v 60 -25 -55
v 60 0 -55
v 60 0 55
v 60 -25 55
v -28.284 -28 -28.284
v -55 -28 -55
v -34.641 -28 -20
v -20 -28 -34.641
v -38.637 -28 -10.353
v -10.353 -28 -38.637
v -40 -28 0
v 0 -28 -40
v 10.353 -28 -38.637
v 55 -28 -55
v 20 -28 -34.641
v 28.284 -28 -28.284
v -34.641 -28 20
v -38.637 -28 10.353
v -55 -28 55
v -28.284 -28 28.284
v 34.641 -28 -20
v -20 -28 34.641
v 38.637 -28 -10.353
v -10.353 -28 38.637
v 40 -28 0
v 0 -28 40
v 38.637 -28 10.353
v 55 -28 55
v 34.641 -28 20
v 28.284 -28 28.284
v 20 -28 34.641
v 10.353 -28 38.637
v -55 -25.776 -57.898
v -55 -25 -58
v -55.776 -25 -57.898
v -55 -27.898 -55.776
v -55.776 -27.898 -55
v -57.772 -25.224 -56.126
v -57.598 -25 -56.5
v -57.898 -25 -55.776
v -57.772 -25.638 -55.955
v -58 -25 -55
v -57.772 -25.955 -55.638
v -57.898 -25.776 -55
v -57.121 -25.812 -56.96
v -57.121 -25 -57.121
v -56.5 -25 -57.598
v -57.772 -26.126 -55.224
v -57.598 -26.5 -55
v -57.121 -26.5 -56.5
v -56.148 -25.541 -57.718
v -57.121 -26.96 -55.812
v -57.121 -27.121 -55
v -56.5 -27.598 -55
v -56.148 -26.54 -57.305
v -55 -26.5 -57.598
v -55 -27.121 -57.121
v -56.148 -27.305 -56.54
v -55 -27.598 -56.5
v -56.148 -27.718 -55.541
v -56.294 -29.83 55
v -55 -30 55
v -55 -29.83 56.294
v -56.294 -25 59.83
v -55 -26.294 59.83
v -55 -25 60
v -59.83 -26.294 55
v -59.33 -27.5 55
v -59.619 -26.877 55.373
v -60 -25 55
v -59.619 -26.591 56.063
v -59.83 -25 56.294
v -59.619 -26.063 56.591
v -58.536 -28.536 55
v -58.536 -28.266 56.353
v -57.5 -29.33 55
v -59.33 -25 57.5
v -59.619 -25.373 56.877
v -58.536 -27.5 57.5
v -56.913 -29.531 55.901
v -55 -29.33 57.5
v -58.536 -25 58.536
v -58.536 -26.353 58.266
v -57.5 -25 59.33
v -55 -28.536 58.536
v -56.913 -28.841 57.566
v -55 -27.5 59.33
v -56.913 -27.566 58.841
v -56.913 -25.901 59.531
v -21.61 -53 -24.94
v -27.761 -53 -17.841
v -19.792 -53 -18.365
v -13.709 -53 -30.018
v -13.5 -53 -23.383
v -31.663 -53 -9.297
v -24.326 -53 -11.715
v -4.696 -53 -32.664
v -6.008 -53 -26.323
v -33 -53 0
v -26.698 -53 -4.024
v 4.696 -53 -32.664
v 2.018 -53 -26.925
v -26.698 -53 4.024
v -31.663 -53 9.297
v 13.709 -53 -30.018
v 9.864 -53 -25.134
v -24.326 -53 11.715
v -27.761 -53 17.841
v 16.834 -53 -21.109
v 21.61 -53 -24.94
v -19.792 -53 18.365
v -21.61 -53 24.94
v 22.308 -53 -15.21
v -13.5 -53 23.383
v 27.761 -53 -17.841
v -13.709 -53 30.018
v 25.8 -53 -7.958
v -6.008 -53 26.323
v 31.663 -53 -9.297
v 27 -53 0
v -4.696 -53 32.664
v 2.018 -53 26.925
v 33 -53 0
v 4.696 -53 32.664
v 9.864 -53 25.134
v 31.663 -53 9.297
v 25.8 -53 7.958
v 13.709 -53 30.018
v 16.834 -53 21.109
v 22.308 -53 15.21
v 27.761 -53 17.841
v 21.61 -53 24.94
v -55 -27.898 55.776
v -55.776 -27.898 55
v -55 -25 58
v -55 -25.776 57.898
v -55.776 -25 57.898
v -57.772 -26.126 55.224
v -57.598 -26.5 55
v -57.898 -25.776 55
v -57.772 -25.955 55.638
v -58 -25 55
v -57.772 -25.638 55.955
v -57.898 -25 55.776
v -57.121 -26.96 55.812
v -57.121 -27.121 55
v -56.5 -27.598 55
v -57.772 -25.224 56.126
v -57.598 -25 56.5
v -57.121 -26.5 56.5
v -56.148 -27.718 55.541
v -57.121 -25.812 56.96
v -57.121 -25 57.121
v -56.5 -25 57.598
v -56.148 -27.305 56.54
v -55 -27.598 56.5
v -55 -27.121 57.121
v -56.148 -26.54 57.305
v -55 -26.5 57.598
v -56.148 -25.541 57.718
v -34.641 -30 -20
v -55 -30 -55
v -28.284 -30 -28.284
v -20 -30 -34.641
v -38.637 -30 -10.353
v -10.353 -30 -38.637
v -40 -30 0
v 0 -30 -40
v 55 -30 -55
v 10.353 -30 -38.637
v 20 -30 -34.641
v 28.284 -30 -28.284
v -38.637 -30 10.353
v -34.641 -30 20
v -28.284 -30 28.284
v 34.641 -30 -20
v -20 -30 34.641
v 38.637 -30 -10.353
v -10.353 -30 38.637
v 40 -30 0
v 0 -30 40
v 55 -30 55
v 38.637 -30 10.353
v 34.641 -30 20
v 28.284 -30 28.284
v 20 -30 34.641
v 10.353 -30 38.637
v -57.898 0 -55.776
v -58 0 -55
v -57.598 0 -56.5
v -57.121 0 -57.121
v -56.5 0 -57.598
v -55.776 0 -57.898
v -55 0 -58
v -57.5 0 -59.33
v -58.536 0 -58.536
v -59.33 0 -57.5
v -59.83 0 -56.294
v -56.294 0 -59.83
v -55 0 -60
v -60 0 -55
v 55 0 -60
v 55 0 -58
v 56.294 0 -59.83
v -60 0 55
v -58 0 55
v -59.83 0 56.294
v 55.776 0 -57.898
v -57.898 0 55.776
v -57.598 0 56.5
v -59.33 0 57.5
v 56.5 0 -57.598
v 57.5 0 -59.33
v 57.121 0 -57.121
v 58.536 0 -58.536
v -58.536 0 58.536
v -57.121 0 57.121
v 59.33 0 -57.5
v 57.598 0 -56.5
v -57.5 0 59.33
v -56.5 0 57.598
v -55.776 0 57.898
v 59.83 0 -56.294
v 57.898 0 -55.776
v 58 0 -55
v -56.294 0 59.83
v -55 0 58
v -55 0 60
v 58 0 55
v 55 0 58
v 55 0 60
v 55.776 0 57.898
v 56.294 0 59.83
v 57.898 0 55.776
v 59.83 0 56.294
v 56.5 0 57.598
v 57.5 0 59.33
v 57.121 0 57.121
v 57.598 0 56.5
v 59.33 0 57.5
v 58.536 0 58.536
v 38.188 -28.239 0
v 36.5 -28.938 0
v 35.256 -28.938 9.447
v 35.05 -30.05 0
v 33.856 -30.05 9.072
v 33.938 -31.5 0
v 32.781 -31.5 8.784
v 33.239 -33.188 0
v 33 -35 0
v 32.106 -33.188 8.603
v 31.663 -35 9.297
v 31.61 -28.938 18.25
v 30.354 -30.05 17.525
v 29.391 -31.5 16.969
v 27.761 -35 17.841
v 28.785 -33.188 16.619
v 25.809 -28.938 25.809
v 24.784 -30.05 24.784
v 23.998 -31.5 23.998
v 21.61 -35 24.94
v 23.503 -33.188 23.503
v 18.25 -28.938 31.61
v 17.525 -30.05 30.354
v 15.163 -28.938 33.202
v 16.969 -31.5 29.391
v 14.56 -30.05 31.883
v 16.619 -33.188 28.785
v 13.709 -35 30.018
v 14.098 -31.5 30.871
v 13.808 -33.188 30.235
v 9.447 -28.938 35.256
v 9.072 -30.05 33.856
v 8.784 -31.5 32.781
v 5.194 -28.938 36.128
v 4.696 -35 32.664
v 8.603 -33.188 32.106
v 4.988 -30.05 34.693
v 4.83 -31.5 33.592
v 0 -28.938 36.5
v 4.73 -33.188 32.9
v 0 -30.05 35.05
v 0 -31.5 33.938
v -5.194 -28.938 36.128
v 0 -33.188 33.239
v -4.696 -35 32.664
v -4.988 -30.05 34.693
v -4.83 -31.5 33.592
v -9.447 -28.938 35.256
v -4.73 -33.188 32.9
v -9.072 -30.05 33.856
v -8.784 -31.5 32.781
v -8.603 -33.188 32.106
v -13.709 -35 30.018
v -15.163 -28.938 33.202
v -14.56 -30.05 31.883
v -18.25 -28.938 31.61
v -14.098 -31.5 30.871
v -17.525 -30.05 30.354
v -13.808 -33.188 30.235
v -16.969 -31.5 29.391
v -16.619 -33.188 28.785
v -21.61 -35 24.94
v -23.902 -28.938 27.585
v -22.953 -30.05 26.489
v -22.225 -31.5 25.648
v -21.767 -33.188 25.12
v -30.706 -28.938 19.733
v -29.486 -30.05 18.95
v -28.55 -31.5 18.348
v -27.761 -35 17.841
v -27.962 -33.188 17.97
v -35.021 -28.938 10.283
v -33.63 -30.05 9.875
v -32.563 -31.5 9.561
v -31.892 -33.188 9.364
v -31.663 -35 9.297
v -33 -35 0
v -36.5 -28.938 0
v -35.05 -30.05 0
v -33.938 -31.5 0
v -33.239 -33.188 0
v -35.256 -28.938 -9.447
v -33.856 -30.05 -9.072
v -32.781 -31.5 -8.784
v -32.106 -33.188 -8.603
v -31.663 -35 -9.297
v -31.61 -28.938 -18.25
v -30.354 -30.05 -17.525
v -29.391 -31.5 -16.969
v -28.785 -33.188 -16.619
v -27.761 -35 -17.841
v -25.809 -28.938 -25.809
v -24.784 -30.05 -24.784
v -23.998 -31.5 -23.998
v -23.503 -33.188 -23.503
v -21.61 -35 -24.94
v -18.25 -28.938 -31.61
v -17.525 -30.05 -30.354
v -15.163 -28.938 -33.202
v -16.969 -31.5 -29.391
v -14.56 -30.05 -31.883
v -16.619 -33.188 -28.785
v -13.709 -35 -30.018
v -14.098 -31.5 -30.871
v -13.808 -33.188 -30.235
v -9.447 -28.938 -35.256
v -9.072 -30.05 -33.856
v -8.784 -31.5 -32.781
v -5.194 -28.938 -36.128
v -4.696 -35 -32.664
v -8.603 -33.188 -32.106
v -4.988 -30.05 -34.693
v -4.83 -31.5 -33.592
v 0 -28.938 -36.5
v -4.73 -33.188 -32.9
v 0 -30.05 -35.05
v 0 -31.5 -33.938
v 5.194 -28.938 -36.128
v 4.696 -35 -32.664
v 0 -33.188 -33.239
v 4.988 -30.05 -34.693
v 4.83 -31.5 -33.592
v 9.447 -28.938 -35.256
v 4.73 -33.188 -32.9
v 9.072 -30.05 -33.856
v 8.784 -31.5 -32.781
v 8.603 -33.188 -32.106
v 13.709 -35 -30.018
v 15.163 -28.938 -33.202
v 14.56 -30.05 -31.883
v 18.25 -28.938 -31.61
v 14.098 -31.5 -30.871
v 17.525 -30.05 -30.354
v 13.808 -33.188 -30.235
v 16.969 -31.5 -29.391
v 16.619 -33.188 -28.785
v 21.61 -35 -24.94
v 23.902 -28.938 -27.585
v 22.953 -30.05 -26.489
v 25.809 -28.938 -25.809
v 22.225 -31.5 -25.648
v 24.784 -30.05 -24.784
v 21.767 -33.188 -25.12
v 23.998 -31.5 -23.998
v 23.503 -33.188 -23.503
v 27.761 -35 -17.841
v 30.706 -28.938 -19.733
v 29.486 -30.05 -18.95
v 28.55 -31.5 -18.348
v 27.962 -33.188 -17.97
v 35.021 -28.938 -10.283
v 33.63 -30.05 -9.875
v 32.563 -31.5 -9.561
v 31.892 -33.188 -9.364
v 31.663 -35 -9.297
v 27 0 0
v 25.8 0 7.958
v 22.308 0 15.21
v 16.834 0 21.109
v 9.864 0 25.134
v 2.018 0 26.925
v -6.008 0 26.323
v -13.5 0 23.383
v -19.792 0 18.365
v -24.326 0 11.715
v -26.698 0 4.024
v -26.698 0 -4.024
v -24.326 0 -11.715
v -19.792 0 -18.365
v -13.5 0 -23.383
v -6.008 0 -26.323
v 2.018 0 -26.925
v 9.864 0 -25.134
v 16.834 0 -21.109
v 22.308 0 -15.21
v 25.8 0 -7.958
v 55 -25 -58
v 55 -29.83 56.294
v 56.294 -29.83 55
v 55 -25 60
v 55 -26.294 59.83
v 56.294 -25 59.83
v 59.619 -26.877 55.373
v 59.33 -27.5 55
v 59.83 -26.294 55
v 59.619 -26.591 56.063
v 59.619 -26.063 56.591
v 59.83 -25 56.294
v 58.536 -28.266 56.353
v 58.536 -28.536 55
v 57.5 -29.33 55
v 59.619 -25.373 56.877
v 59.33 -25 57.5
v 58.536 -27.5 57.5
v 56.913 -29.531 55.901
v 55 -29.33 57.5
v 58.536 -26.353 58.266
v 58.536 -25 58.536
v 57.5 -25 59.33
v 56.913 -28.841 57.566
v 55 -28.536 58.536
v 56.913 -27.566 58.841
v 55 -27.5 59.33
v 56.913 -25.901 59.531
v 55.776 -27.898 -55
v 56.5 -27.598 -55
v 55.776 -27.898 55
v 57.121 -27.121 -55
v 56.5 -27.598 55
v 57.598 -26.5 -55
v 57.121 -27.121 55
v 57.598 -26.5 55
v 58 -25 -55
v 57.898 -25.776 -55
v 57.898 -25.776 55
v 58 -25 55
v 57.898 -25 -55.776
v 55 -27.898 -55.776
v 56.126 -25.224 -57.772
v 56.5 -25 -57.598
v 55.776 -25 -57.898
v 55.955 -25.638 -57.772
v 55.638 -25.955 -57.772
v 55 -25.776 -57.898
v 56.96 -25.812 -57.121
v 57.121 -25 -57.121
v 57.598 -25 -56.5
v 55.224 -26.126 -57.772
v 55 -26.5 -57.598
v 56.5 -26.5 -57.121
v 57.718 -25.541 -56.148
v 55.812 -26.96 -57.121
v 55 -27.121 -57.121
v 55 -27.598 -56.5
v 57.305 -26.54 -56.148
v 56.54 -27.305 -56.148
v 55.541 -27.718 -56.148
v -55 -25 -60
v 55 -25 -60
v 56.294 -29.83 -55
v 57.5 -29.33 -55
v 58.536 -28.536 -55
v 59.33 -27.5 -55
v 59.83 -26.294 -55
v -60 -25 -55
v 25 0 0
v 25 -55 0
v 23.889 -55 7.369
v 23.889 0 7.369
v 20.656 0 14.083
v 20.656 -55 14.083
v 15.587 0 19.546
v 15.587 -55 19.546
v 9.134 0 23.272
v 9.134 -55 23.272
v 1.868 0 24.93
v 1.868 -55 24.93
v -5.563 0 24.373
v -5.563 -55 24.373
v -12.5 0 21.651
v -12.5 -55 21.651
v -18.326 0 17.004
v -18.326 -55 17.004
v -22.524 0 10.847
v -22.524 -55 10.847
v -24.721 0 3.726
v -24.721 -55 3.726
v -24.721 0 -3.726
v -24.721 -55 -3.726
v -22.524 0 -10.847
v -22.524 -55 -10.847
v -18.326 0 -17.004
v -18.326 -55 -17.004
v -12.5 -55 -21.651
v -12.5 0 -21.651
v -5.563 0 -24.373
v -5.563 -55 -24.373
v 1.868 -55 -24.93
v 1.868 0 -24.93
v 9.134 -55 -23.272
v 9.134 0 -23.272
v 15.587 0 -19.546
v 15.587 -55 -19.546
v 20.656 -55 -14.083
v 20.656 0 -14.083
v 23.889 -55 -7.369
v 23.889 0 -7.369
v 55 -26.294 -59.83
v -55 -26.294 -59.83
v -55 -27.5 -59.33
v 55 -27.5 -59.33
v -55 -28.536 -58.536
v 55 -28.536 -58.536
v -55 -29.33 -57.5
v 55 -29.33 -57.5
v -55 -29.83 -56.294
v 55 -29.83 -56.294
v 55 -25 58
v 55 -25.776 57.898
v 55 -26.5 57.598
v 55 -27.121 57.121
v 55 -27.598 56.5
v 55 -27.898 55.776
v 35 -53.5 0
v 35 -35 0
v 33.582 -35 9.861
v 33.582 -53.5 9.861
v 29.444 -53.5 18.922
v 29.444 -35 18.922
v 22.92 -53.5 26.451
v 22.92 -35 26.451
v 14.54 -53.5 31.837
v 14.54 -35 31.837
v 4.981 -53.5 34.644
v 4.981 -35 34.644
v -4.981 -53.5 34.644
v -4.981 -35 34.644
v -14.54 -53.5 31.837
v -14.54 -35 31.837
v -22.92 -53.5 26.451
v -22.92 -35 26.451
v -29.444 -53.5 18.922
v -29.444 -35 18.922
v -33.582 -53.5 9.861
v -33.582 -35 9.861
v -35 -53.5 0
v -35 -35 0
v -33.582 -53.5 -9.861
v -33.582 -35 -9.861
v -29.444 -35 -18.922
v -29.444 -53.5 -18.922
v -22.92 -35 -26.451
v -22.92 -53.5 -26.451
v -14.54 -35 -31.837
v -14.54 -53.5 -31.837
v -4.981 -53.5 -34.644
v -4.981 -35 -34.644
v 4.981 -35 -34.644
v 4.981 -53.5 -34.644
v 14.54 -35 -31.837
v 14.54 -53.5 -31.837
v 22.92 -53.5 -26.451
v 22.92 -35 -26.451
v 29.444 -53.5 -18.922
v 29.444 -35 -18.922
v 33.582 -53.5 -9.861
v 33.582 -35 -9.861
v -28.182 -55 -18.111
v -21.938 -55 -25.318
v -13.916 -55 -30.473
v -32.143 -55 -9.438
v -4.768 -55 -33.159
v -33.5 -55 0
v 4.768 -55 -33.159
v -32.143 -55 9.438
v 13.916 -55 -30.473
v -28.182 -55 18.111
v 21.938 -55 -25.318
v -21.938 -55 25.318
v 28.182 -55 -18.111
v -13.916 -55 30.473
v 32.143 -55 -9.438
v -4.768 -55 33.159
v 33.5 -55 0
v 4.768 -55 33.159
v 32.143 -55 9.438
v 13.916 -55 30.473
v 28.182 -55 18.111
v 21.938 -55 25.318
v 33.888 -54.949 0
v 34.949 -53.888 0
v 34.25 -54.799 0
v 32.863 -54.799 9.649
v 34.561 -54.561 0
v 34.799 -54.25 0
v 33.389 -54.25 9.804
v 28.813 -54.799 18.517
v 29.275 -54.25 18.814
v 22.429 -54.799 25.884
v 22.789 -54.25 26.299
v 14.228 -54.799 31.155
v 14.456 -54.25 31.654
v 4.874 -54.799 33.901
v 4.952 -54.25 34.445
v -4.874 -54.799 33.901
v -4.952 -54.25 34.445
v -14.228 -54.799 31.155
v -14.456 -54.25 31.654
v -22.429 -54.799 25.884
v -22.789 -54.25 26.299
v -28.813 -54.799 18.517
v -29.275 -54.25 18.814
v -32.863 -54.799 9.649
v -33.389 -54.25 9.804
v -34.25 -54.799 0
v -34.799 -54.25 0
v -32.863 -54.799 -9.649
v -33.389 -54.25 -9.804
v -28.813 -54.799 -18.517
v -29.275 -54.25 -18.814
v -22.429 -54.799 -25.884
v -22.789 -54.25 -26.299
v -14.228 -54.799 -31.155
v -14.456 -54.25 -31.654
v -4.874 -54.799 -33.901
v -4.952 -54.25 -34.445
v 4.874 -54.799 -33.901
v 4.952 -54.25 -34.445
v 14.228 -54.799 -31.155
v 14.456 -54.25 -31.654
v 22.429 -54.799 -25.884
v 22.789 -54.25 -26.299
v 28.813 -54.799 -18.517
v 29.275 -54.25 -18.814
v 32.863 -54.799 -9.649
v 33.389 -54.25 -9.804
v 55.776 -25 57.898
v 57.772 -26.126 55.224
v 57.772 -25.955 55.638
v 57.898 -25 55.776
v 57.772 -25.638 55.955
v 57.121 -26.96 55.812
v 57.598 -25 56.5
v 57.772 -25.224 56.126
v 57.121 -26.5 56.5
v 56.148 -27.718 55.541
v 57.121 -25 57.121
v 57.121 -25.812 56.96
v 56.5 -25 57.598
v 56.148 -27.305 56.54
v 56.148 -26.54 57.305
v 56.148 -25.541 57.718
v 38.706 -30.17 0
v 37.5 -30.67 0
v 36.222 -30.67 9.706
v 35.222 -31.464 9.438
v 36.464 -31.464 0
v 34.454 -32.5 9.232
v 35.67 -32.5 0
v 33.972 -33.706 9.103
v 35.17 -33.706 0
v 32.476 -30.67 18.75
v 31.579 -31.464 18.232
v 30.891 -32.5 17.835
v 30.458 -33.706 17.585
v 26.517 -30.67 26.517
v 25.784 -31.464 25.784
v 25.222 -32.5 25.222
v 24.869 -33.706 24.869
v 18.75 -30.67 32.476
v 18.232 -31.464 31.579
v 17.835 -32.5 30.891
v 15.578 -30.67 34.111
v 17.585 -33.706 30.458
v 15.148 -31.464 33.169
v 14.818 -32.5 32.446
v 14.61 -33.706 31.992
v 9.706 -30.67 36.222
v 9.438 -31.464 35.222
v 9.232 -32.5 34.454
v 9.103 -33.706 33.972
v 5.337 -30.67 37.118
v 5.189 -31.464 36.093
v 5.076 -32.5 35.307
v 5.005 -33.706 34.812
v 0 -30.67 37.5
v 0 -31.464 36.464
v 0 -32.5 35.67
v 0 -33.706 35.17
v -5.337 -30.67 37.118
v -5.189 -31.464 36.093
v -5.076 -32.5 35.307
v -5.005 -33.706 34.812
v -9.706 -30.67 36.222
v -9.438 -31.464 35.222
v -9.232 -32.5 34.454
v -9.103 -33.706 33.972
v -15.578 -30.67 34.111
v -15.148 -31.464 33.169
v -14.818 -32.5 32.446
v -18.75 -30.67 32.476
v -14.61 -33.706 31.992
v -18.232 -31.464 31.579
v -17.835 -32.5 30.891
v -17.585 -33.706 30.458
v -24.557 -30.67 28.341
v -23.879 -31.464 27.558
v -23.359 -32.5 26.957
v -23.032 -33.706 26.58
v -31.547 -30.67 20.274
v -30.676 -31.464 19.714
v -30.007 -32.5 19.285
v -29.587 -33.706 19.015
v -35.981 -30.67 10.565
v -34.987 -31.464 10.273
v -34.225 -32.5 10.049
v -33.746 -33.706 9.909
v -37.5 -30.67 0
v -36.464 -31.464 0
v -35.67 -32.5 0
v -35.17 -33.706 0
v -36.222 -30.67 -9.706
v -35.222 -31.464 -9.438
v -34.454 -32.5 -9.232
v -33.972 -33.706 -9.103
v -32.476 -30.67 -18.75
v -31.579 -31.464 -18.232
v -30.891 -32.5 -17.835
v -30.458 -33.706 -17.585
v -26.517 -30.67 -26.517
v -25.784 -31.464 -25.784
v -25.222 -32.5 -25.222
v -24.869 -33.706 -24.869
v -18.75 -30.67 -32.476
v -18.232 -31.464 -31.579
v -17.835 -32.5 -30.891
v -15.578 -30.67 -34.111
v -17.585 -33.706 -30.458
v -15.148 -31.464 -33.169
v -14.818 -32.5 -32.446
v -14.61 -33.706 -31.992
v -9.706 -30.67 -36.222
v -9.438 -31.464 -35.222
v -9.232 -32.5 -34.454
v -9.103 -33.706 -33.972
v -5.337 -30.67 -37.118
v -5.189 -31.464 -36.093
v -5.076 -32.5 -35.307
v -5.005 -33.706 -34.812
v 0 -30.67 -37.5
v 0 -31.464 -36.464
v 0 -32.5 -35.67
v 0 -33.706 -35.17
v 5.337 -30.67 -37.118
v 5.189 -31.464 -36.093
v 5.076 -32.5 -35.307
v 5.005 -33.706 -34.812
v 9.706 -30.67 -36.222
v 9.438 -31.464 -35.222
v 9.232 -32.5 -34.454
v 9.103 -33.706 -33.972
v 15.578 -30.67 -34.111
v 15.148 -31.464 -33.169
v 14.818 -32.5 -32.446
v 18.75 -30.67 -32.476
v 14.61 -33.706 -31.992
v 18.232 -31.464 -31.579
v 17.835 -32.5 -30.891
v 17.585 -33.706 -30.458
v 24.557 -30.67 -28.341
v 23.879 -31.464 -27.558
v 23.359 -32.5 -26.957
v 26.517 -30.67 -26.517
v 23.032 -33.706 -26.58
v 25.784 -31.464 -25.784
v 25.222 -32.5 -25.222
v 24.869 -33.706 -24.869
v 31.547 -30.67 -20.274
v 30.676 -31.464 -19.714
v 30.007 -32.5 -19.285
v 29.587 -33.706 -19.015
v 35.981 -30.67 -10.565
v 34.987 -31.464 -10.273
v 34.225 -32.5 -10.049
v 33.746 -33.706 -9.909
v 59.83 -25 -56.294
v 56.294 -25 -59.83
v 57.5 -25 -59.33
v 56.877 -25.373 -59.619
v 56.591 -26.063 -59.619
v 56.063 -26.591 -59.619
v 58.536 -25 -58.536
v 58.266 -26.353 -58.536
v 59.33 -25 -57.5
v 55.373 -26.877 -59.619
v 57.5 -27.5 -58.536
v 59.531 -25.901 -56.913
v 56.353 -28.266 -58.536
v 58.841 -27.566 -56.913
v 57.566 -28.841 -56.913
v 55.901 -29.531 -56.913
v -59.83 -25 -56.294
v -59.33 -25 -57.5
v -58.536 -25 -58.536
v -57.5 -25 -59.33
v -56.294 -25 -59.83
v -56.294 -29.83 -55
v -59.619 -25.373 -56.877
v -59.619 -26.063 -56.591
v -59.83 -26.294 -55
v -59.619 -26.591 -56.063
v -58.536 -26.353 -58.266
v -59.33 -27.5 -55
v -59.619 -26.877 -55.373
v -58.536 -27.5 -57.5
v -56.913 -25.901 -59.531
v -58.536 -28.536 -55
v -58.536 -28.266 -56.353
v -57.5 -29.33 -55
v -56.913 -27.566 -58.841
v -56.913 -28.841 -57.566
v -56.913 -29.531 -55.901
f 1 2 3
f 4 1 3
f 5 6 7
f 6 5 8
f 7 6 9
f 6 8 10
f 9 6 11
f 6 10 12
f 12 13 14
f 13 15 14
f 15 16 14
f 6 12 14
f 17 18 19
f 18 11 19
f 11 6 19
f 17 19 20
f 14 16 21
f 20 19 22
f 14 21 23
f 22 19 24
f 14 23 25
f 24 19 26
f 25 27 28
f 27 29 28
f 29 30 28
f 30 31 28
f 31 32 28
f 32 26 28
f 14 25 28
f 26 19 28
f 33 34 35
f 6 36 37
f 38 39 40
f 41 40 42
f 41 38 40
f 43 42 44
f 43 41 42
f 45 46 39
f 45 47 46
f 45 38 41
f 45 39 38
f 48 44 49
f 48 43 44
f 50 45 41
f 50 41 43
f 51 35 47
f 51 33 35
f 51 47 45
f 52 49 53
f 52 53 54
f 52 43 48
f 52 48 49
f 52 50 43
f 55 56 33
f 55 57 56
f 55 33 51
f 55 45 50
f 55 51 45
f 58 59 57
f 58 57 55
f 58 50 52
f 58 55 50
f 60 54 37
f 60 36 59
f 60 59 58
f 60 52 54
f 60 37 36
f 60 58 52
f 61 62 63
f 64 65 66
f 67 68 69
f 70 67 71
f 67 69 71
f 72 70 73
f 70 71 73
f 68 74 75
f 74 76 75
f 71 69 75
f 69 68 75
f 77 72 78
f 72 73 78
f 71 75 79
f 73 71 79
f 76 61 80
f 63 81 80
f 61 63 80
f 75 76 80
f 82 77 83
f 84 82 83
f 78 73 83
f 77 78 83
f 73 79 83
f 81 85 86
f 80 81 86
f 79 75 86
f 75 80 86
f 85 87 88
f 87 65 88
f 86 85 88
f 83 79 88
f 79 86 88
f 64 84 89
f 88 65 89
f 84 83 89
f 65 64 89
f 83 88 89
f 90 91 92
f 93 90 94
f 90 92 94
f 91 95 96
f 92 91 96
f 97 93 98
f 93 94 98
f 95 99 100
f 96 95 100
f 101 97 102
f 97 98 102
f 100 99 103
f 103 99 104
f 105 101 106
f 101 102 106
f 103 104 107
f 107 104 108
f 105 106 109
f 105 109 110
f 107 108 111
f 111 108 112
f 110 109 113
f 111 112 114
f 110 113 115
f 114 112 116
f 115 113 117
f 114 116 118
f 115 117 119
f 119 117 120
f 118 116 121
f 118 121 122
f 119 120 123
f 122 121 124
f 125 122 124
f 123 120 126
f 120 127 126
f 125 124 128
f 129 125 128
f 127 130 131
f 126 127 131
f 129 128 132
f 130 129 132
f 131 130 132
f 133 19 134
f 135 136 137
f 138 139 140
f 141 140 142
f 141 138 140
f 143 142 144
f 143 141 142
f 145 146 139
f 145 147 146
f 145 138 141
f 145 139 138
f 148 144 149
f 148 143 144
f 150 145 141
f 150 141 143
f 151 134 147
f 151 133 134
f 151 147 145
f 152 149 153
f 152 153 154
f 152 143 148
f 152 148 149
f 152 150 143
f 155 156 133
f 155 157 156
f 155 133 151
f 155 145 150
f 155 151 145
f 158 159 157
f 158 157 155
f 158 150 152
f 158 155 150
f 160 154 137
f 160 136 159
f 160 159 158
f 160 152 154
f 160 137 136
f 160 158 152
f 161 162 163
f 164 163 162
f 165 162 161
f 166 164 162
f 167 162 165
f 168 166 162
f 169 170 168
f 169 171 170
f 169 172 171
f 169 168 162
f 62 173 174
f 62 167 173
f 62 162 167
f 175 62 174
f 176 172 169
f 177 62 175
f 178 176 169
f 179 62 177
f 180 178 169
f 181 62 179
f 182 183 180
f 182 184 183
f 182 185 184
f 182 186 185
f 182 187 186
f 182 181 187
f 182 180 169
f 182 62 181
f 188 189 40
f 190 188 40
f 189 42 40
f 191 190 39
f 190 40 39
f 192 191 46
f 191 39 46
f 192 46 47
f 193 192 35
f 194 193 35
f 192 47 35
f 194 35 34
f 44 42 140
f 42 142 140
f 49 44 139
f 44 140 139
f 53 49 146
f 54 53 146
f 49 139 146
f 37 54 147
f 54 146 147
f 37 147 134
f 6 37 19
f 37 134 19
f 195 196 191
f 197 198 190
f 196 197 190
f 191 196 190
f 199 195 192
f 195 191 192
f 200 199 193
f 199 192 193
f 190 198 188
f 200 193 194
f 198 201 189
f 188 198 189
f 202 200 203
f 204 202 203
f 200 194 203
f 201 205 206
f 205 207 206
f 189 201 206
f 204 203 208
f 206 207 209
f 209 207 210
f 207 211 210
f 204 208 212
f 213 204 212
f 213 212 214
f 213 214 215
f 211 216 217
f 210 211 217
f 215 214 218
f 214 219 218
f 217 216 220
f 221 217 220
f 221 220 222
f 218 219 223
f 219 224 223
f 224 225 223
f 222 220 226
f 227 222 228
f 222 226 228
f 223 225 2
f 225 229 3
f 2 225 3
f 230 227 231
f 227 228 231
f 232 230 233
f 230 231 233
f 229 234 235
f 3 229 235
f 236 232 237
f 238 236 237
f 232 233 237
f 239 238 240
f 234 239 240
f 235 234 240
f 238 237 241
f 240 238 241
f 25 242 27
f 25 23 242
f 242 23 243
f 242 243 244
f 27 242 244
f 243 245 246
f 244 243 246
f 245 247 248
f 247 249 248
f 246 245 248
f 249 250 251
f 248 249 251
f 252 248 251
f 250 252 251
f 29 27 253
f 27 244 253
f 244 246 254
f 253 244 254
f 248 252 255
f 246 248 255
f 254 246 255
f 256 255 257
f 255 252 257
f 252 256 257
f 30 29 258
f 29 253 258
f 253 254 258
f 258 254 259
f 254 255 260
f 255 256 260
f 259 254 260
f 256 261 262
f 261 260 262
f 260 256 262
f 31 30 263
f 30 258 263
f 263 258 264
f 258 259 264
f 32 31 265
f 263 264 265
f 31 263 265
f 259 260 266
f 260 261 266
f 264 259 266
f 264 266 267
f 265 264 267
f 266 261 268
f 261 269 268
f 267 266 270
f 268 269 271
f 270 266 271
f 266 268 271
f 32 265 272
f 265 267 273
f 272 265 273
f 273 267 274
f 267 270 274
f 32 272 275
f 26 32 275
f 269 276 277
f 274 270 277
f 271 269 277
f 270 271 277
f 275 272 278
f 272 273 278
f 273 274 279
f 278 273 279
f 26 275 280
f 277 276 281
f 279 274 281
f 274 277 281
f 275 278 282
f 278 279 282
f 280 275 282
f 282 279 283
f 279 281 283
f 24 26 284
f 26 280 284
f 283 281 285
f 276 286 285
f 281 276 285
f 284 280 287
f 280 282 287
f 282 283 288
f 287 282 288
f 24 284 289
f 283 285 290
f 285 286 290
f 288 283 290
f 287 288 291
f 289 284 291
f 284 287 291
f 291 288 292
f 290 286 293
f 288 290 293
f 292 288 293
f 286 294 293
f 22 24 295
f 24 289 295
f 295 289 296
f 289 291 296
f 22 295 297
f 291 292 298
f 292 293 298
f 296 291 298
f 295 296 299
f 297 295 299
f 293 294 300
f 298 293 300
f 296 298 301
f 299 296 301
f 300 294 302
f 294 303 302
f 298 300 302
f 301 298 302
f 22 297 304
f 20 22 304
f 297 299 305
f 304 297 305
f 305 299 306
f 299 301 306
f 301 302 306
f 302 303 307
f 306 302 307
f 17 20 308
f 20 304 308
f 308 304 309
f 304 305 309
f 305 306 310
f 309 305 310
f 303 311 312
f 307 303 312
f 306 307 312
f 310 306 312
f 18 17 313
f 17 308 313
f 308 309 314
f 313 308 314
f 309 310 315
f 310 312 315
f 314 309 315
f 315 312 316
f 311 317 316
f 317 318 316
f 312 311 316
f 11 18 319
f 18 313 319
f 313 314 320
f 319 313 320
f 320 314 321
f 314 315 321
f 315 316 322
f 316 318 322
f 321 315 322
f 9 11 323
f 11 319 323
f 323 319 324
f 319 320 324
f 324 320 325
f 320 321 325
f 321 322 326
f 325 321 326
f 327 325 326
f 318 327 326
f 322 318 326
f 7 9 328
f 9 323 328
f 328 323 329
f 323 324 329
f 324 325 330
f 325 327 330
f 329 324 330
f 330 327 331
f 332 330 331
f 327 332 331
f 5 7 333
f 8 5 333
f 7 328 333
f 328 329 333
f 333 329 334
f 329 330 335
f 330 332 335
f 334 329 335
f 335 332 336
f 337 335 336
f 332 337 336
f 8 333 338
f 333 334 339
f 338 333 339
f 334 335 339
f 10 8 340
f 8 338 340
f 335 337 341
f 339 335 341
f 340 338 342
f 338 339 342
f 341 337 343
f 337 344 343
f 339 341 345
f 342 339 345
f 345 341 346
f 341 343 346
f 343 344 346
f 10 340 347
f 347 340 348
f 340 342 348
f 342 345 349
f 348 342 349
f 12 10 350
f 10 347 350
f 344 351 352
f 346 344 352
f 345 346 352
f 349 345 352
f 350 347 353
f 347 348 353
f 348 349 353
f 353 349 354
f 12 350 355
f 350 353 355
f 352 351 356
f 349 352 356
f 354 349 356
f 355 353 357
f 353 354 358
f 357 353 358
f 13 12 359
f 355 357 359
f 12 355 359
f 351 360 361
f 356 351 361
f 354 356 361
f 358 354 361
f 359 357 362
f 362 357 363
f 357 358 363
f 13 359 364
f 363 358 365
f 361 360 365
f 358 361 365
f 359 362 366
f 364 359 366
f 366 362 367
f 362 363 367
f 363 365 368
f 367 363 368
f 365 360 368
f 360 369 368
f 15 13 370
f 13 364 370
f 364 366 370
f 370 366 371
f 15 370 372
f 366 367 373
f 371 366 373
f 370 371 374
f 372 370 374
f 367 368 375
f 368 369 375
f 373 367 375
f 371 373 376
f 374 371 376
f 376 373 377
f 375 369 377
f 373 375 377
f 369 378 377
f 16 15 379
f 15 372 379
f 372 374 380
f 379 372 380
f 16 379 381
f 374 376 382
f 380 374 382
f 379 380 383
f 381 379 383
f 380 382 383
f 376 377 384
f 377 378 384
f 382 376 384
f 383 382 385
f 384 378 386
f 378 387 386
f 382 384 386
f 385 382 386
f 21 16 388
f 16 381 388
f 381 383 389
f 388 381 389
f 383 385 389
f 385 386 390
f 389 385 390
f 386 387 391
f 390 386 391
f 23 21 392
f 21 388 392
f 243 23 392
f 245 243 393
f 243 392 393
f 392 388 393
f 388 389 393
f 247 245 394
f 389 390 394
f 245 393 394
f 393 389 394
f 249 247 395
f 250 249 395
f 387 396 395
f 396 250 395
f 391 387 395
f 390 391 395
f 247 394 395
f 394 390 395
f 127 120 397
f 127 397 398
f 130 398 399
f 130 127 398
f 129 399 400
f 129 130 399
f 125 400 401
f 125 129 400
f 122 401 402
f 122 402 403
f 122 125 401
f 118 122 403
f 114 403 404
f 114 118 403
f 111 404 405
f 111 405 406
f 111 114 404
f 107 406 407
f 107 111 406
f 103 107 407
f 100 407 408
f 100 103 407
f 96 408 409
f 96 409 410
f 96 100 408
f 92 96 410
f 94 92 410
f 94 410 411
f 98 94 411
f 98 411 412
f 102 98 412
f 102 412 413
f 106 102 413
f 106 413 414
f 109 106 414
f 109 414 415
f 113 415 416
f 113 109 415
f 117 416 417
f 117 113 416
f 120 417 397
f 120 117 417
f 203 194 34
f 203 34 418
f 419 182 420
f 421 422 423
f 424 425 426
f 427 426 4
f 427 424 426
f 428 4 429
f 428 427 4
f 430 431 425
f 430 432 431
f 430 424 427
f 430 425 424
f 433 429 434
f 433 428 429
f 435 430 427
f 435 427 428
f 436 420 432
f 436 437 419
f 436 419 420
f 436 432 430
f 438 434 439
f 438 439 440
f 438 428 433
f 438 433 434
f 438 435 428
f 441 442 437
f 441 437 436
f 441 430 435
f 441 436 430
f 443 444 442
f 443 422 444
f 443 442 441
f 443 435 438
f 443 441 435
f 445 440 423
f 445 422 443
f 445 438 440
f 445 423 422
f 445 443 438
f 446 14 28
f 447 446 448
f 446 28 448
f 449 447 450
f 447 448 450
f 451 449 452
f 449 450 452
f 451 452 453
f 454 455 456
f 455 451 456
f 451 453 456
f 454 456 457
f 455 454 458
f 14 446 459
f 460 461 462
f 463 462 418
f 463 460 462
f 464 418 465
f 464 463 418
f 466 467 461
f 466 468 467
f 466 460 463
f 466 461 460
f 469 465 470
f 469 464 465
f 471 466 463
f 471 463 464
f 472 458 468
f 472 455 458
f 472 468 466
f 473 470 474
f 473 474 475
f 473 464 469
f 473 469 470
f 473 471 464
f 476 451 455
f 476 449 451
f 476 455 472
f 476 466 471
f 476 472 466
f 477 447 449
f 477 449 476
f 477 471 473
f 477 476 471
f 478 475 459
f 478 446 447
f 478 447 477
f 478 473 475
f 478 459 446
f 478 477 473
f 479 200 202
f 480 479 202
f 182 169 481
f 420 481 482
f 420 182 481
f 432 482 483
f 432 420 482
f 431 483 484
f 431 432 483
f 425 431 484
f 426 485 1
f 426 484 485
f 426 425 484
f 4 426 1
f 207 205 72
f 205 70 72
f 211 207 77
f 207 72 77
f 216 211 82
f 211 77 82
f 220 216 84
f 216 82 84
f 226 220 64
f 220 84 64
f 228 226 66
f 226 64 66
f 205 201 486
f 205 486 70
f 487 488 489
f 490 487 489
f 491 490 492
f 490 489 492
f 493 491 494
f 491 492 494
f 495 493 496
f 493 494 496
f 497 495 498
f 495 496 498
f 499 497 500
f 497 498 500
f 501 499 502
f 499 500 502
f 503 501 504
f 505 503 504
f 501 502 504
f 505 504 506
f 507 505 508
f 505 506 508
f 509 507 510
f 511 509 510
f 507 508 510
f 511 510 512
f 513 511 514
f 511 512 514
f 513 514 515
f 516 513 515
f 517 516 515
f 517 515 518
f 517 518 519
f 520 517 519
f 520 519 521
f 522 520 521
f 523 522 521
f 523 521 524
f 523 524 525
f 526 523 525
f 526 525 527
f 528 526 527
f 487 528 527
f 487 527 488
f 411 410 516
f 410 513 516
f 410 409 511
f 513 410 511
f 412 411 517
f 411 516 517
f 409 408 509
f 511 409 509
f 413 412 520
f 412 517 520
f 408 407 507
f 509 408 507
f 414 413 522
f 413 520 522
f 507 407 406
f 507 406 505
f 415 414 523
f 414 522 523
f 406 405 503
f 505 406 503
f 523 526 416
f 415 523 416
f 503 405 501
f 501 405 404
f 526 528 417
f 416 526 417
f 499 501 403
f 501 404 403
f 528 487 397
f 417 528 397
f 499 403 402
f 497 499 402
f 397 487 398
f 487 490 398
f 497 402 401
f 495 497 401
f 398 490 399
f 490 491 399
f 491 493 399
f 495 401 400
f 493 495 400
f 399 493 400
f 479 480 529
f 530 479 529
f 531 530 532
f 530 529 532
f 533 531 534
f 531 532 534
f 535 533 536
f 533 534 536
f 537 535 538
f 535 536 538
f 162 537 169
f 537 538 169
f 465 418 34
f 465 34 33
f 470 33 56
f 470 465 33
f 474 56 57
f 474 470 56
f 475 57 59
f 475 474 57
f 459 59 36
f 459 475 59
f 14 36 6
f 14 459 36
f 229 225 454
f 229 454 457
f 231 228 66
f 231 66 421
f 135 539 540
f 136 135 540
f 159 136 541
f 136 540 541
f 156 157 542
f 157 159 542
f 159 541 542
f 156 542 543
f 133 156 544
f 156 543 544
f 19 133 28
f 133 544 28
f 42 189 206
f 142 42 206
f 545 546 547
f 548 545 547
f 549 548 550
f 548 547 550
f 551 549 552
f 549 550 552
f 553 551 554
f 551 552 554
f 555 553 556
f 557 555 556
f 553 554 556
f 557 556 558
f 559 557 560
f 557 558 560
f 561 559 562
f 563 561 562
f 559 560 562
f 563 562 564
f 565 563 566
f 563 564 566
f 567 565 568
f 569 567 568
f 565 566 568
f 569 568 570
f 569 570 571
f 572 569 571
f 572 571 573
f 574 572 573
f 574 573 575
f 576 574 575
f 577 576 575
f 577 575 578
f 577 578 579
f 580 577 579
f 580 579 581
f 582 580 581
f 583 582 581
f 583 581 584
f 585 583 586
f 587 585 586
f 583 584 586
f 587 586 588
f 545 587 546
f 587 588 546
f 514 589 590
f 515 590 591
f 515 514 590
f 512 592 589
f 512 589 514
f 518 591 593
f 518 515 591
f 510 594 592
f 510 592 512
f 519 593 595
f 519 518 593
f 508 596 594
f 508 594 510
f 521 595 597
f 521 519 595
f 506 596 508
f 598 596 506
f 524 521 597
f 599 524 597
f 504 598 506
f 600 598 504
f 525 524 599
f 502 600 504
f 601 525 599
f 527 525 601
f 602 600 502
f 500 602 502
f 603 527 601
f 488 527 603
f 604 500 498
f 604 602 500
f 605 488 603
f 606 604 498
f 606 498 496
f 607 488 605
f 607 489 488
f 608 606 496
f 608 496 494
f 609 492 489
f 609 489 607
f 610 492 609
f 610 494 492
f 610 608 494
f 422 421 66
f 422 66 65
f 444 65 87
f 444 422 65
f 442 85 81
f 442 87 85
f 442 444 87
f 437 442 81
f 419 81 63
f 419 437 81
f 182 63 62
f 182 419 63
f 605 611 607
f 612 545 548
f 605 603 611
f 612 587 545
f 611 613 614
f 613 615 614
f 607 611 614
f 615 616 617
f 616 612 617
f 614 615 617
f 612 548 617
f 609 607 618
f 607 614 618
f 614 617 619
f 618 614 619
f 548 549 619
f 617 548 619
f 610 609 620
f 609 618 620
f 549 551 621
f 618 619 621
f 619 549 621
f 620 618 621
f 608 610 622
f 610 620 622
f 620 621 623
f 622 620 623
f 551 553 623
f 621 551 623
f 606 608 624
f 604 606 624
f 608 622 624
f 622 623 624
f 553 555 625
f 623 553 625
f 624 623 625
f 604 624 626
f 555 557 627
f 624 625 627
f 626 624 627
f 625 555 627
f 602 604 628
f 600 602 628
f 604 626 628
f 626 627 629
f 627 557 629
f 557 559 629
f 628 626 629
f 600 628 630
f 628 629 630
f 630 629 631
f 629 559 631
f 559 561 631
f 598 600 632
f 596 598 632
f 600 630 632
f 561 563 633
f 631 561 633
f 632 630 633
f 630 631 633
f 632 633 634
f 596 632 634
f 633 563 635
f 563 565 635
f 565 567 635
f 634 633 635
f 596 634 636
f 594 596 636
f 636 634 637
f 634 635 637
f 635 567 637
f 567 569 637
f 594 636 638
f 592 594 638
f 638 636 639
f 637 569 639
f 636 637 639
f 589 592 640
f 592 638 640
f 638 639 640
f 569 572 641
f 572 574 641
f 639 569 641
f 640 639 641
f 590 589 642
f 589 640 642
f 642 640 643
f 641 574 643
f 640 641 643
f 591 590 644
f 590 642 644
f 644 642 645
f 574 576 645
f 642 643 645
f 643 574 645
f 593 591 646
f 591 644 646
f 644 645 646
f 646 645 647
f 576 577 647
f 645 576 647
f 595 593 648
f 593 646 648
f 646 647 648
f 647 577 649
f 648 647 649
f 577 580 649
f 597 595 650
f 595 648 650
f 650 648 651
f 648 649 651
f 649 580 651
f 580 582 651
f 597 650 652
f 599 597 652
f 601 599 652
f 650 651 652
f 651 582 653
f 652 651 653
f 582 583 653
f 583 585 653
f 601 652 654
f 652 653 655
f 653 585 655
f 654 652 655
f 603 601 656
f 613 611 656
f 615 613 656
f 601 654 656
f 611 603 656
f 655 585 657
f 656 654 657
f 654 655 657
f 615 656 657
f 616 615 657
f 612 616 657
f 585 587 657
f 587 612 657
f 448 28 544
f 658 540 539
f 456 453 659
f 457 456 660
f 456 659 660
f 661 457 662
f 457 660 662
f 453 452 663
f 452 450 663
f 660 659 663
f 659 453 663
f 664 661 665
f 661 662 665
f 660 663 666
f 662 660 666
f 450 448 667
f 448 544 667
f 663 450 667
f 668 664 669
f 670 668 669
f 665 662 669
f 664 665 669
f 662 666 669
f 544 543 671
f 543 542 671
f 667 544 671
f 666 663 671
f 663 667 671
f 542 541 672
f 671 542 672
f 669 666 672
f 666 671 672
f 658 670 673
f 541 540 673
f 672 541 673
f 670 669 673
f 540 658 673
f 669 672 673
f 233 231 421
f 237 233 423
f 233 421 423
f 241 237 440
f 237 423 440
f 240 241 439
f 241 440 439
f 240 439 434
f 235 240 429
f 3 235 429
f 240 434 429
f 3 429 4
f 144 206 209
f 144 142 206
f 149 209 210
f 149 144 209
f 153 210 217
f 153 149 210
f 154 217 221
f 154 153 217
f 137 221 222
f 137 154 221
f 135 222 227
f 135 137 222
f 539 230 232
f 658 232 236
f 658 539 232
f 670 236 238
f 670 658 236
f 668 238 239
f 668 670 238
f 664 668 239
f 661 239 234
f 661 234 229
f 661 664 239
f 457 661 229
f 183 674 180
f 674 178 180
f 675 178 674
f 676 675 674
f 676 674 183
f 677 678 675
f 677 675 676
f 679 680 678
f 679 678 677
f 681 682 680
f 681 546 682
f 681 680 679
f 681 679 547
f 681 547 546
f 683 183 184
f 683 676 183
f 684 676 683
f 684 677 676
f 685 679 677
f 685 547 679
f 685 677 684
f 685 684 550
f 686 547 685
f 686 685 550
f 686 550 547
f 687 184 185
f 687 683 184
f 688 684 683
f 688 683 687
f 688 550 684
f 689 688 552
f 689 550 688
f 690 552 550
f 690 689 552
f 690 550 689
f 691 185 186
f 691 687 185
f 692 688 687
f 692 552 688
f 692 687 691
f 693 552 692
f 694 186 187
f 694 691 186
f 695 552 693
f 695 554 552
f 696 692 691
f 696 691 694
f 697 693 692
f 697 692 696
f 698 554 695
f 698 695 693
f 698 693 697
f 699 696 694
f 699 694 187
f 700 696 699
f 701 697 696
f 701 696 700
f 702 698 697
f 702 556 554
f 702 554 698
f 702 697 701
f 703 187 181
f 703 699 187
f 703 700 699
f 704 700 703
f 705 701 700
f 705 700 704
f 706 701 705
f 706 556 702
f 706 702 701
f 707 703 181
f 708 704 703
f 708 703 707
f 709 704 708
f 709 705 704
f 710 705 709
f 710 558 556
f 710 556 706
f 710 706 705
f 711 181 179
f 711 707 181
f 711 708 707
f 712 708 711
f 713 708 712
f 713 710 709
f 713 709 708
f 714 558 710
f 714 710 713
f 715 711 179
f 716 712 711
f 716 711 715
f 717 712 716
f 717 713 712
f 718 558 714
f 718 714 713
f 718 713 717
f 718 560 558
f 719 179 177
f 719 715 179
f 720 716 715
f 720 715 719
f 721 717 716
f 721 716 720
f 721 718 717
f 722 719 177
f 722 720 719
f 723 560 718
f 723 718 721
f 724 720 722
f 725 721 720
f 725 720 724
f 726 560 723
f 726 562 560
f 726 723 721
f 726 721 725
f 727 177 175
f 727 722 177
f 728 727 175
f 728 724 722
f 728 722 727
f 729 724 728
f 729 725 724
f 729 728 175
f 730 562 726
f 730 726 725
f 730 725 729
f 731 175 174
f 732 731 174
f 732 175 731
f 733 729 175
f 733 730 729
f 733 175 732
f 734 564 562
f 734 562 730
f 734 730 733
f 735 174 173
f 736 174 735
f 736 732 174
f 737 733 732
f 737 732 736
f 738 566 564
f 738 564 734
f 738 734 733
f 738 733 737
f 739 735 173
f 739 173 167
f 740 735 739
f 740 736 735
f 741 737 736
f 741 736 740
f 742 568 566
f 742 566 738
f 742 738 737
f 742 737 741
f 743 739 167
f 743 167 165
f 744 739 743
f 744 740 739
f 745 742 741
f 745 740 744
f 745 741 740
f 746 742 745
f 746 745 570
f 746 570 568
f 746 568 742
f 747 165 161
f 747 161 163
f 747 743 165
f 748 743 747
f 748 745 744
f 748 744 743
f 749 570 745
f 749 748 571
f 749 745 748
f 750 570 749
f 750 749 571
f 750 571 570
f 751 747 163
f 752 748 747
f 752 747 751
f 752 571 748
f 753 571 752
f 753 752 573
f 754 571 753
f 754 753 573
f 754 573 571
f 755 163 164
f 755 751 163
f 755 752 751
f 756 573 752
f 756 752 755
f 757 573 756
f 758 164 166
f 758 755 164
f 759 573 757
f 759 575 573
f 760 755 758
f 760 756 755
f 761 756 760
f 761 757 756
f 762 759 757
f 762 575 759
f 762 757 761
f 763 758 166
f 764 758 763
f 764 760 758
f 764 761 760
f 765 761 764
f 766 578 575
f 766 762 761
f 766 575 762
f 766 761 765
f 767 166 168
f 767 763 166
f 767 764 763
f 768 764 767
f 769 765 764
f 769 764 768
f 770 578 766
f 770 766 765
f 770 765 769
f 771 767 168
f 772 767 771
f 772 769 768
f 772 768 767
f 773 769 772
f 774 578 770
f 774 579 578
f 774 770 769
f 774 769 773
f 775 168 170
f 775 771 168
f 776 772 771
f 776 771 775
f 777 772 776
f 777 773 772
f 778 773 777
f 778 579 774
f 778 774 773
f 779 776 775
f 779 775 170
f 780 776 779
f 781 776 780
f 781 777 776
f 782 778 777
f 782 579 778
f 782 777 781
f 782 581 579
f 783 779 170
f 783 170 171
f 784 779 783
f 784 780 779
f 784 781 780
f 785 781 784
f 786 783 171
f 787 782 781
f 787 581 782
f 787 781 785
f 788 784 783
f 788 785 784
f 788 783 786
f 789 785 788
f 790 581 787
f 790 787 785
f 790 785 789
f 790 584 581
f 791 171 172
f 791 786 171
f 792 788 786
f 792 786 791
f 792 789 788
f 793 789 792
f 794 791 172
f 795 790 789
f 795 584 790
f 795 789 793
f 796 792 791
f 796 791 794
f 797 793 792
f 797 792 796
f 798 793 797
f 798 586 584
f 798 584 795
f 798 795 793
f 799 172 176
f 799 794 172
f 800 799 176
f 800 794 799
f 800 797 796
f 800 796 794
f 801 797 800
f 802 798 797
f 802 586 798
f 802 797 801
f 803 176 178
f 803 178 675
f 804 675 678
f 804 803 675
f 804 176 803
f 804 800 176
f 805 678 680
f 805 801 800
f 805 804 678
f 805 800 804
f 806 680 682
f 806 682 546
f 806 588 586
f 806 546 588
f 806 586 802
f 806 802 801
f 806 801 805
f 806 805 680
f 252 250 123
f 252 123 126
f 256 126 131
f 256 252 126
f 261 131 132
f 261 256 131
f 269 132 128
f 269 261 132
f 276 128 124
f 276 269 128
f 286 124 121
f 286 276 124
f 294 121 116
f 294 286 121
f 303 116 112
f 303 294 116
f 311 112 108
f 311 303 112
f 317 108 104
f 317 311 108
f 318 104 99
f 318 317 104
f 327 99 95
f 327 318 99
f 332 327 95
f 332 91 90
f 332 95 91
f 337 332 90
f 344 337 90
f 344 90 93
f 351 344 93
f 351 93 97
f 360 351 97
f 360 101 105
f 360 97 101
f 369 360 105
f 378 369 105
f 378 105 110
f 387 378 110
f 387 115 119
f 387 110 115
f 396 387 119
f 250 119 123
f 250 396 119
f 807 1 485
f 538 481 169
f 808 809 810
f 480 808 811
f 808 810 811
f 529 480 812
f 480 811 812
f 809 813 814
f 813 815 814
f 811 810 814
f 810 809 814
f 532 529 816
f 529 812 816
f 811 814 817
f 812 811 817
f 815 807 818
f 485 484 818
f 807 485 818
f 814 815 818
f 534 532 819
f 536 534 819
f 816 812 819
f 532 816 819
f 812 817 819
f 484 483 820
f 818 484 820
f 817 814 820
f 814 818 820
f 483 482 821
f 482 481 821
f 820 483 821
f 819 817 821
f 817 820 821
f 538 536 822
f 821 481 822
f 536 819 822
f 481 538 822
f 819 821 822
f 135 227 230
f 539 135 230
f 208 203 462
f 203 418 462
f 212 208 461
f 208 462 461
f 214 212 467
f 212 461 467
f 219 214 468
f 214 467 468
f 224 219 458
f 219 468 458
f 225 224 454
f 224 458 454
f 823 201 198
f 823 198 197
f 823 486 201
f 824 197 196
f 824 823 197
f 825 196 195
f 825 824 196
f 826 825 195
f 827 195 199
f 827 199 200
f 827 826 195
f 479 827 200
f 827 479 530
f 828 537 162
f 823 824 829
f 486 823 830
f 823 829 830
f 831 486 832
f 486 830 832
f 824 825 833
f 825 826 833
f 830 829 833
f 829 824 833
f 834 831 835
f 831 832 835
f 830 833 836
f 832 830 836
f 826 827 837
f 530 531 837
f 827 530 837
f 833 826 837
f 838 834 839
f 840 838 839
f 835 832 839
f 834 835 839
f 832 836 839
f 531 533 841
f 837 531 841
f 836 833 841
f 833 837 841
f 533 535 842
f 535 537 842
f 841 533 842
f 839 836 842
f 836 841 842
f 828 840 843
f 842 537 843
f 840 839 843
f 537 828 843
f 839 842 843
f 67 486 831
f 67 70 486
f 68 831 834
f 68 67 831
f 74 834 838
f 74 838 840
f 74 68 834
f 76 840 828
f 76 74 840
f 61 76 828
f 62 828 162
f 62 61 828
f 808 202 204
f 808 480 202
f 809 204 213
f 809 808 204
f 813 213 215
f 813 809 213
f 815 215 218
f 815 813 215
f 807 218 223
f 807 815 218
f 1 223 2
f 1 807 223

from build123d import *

# Parameters (mm, degrees)
F0_W     = 120
F0_H     = 120
F1_DEPTH = 30
F2_R     = 35
F3_DEPTH = 25
F4_R     = 25
F5_DEPTH = 55.001
F6_R     = 5
F7_R     = 1.5
F8_T     = -2


with BuildPart() as f1:
    # F0 (on Front) → F1 (new body)
    with BuildSketch(Plane.XZ):
        Rectangle(F0_W, F0_H)
    extrude(amount=F1_DEPTH)

    # F2 (on face) → F3 (join)
    with BuildSketch(Plane.XZ.offset(30)):
        Circle(F2_R)
    extrude(amount=F3_DEPTH)

    # F4 (on face) → F5 (cut, through all)
    with BuildSketch(Plane.XZ.offset(55)):
        Circle(F4_R)
    extrude(amount=-F5_DEPTH, mode=Mode.SUBTRACT)

    # F6
    f6_edges = [f1.edges().sort_by_distance(p)[0] for p in [
        (-35, -30, 0),
        (0, -30, 60),
        (60, -30, 0),
        (60, -15, 60),
        (60, -15, -60),
        (0, -30, -60),
        (-60, -15, -60),
        (-60, -30, 0),
        (-60, -15, 60),
    ]]
    fillet(f6_edges, radius=F6_R)

    # F7
    f7_edges = [f1.edges().sort_by_distance(p)[0] for p in [
        (-35, -55, 0),
    ]]
    fillet(f7_edges, radius=F7_R)

    # F8
    f8_openings = [f1.faces().sort_by_distance(p)[0] for p in [
        (58.302944, 0, 0),
    ]]
    offset(amount=F8_T, openings=f8_openings)


solid = f1.part
